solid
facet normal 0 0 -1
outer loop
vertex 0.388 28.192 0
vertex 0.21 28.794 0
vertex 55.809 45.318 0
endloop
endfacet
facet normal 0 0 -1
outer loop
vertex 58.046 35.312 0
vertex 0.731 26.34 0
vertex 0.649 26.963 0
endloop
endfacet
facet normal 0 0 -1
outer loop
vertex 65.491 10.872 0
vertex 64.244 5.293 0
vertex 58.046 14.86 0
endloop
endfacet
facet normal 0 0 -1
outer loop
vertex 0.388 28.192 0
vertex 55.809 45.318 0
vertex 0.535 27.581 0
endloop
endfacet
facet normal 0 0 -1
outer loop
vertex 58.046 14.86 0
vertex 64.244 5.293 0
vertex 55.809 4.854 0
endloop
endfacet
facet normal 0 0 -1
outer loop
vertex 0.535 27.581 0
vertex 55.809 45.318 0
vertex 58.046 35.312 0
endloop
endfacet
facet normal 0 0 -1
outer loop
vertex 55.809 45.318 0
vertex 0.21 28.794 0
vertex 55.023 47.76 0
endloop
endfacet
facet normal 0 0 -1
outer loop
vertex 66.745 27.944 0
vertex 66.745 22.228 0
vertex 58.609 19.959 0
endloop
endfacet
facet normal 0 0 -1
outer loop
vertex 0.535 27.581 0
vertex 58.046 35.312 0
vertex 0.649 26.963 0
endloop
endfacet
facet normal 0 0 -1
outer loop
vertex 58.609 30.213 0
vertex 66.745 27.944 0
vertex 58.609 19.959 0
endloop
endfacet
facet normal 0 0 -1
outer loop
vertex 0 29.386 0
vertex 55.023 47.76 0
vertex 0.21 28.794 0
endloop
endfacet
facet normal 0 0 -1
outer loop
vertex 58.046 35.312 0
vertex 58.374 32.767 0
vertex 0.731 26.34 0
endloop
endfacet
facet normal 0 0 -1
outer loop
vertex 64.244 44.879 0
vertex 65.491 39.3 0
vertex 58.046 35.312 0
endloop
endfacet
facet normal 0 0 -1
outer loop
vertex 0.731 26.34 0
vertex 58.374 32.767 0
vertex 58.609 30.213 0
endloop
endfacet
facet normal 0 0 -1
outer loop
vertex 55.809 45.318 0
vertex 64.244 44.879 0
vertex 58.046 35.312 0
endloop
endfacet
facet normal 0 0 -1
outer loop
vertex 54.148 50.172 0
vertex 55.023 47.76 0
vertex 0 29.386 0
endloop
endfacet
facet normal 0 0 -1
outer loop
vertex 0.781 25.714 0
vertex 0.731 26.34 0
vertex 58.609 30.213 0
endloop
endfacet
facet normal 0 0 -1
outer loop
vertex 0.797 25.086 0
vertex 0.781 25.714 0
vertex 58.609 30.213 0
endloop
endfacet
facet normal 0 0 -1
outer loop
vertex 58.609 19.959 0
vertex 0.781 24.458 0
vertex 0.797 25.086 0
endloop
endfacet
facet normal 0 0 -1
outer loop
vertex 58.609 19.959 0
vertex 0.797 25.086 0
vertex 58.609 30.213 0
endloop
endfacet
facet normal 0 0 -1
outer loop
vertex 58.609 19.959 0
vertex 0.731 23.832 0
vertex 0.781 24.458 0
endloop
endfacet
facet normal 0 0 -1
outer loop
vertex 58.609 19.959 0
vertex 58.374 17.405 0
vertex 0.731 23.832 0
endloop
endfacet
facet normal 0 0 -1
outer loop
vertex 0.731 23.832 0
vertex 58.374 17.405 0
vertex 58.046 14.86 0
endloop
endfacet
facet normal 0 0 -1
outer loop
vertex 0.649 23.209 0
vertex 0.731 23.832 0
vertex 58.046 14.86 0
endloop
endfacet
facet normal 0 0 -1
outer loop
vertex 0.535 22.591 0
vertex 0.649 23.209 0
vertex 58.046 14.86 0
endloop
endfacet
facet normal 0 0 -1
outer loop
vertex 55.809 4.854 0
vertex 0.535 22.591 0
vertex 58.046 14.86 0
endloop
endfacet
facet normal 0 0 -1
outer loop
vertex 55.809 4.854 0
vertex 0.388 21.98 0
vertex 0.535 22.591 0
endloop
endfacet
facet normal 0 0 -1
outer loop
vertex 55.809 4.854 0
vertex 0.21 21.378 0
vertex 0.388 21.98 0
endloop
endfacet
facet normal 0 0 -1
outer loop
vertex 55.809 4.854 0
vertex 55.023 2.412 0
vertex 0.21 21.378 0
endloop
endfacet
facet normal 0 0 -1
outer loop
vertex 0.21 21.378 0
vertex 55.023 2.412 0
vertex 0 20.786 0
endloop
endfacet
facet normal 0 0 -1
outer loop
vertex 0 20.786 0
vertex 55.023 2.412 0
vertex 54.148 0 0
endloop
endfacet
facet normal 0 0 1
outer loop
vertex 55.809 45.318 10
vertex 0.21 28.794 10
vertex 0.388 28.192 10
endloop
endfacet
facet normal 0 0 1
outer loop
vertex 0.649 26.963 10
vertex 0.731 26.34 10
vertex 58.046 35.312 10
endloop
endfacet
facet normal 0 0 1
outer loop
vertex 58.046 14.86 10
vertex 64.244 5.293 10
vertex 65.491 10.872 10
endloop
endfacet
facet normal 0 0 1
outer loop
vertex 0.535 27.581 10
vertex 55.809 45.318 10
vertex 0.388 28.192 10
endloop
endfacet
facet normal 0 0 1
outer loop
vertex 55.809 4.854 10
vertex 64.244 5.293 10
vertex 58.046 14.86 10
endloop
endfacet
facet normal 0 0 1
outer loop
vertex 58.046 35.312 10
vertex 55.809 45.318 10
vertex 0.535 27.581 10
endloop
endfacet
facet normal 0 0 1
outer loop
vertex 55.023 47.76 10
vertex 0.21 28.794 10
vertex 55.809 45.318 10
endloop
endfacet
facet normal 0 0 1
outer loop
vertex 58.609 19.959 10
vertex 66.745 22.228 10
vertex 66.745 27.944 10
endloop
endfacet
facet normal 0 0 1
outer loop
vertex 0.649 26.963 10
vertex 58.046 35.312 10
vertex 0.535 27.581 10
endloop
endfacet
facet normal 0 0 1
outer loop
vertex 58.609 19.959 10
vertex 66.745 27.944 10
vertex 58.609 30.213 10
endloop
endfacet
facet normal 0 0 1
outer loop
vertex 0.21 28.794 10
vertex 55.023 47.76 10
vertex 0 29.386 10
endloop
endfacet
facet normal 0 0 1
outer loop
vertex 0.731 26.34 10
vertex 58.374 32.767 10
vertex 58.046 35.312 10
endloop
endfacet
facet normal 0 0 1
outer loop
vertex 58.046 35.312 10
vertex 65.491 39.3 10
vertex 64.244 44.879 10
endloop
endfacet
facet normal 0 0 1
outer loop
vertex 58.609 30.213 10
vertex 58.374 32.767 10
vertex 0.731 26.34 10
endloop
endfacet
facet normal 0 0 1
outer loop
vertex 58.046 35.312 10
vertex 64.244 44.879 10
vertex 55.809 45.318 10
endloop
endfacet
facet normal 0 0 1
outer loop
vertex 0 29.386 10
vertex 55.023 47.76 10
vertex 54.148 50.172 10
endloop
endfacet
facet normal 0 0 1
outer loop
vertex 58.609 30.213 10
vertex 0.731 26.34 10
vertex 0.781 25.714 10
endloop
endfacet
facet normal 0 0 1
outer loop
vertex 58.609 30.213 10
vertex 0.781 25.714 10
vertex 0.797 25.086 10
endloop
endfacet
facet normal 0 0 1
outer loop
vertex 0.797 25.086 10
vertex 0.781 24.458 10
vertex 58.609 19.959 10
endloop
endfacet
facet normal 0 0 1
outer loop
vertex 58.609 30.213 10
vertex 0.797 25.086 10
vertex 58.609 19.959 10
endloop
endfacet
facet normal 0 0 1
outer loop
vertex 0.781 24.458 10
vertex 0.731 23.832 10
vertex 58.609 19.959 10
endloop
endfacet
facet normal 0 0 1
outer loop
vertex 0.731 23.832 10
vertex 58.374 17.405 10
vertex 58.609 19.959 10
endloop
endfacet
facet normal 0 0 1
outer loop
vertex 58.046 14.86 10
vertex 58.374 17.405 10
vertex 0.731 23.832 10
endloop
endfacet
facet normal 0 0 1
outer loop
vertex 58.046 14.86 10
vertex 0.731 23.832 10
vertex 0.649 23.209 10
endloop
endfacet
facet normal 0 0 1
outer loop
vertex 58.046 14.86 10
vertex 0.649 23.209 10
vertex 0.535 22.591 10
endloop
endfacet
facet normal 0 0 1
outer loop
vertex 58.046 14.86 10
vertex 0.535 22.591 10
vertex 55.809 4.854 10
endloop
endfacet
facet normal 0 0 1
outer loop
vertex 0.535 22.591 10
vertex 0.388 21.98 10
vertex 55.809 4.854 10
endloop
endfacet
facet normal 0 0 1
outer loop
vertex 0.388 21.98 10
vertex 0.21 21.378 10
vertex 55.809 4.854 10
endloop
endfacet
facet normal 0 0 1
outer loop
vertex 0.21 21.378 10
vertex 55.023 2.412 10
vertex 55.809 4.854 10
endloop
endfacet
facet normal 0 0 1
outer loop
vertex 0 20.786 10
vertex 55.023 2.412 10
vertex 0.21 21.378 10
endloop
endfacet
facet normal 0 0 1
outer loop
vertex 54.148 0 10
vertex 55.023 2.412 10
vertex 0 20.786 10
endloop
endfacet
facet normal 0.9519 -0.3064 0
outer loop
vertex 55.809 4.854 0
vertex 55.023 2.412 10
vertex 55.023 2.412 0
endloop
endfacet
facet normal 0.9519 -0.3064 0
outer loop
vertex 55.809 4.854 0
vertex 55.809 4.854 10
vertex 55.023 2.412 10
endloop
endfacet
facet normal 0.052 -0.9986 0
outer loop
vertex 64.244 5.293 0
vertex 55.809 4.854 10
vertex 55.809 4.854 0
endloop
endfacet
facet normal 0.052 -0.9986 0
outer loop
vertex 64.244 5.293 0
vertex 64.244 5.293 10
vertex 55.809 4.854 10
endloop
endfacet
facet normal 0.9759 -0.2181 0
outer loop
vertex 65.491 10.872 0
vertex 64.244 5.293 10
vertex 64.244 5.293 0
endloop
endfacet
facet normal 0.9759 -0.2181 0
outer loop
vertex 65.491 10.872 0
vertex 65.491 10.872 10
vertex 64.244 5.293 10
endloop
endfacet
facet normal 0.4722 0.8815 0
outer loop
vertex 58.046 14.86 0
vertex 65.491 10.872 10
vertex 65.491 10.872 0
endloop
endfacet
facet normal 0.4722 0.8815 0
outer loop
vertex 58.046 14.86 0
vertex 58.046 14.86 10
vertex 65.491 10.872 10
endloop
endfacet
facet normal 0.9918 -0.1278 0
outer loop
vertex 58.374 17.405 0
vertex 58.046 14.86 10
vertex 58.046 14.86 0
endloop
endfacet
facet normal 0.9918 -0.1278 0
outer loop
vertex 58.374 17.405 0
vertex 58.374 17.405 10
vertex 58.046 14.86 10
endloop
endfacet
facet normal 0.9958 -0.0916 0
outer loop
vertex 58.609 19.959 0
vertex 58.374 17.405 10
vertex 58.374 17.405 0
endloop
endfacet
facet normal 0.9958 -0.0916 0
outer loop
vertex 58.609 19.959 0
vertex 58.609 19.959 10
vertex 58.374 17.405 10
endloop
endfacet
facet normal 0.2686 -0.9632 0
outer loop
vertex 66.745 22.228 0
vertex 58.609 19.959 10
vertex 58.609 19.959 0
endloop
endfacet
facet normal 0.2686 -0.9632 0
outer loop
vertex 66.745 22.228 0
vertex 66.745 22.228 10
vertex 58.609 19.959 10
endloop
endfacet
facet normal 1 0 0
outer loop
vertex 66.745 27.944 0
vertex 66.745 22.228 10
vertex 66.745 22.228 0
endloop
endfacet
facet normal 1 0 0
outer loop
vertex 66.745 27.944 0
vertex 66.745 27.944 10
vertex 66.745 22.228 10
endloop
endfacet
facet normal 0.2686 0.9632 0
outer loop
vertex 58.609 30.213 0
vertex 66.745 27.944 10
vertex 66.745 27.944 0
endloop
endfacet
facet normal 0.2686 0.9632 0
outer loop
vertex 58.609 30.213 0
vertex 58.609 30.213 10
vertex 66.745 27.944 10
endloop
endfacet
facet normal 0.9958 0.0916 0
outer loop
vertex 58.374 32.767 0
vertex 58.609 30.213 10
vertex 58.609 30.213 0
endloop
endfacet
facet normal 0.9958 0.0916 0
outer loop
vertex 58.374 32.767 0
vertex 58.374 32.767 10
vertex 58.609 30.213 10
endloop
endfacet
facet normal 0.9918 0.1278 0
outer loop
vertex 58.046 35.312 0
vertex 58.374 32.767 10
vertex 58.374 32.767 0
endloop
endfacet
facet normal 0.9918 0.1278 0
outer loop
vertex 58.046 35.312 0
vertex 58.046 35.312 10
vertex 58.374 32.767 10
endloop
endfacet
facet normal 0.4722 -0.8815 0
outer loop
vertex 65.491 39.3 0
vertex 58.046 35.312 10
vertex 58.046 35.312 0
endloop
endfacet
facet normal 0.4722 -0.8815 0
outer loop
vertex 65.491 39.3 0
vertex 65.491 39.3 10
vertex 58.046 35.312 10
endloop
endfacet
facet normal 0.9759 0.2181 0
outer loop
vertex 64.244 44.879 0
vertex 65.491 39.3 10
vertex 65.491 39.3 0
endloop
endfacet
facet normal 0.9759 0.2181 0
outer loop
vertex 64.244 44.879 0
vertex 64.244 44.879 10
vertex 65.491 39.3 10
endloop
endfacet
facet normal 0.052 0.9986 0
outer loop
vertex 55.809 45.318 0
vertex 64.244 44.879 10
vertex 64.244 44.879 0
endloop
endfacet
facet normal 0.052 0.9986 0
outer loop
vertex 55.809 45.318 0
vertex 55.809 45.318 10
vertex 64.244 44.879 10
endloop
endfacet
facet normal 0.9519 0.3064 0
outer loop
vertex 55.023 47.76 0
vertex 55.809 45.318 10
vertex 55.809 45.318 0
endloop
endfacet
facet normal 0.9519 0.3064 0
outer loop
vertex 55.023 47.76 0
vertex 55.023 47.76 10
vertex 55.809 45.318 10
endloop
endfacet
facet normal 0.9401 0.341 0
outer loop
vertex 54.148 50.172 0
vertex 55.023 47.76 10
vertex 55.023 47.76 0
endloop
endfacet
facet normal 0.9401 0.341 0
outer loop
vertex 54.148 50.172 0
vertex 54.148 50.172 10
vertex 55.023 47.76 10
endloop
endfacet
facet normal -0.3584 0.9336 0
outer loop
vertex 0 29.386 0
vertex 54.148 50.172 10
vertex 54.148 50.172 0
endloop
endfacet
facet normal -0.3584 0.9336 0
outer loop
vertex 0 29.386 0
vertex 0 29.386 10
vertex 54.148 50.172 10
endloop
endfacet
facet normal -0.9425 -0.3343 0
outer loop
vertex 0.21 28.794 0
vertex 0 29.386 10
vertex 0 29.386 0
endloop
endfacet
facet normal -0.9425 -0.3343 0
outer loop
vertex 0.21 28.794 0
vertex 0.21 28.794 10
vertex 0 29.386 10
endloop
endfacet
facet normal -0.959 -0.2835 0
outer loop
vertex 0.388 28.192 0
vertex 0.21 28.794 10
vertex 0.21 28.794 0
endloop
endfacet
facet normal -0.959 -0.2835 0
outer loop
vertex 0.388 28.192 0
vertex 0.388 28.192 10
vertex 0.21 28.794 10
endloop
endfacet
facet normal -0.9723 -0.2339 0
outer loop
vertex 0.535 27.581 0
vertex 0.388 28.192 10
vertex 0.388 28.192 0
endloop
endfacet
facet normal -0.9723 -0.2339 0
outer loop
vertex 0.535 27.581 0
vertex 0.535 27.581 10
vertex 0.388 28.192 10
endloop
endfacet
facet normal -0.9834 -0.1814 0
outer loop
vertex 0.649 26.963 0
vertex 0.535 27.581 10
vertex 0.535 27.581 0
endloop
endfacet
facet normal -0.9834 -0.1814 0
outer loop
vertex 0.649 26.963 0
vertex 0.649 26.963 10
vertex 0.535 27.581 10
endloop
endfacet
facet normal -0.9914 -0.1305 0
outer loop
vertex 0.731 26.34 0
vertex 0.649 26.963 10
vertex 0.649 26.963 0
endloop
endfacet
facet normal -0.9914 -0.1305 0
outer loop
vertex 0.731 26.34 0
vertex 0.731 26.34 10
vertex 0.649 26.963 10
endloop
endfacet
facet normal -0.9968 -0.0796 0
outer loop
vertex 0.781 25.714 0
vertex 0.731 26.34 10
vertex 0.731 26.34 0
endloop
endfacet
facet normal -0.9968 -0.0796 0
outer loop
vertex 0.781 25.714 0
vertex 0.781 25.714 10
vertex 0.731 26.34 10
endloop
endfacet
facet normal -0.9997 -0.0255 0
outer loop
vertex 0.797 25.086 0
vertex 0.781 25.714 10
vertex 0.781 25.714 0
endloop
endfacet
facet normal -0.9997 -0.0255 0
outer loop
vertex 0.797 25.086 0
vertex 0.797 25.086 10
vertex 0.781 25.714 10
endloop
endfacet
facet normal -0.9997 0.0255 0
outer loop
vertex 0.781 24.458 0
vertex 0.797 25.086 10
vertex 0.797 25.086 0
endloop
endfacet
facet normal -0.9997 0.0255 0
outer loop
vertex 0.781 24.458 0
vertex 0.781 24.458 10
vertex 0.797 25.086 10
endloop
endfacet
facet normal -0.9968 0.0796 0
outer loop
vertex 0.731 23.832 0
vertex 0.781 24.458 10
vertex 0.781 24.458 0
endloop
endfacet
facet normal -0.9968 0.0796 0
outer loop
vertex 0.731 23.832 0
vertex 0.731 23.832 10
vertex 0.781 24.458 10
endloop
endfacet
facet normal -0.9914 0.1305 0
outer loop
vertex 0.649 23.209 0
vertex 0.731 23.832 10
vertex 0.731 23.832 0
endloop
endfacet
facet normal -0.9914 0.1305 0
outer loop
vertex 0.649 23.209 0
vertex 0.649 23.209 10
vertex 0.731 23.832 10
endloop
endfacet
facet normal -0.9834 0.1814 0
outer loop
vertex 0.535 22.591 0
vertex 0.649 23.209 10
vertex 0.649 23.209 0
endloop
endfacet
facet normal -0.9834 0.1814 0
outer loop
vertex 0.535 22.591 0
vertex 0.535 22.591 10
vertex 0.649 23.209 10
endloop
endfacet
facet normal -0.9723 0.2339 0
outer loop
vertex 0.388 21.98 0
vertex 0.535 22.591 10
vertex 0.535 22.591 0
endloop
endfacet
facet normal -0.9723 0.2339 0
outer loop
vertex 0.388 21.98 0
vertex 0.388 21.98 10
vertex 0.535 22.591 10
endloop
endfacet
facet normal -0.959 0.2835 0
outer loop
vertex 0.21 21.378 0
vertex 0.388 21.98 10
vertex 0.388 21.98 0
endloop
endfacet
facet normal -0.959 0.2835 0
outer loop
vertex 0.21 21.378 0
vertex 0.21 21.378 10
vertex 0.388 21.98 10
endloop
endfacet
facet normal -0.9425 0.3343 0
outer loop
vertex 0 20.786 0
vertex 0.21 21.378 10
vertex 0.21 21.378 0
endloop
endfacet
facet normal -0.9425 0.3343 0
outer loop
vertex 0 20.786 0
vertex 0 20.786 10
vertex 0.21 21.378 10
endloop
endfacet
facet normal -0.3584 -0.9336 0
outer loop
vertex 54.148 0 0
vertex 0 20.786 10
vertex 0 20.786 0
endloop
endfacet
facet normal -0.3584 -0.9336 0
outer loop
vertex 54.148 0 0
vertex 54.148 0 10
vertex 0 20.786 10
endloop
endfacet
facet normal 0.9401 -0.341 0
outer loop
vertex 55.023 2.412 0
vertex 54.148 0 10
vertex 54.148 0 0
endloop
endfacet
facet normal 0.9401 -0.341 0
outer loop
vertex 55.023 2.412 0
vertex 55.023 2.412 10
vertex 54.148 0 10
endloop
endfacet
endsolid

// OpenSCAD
$fn = 32;

// ----------------------------------------------------------------------
// Gear sector: 3 teeth on 42 degrees
// ----------------------------------------------------------------------

// --- parameters (mm) ---
sector_angle = 42;        // sector angle, degrees
root_r = 70;              // root circle radius
tooth_h = 8;              // tooth height over the root circle
teeth = 3;                // number of teeth on the sector
hub_r = 12;               // hub bore radius
plate_t = 10;             // sector thickness, Z
arc_step = 3;             // sampling step of the root/hub arcs, degrees

tip_r = root_r + tooth_h;  // tip circle radius

profile = [[54.148, 0], [55.023, 2.412], [55.809, 4.854], [64.244, 5.293], [65.491, 10.872], [58.046, 14.86], [58.374, 17.405], [58.609, 19.959], [66.745, 22.228], [66.745, 27.944], [58.609, 30.213], [58.374, 32.767], [58.046, 35.312], [65.491, 39.3], [64.244, 44.879], [55.809, 45.318], [55.023, 47.76], [54.148, 50.172], [0, 29.386], [0.21, 28.794], [0.388, 28.192], [0.535, 27.581], [0.649, 26.963], [0.731, 26.34], [0.781, 25.714], [0.797, 25.086], [0.781, 24.458], [0.731, 23.832], [0.649, 23.209], [0.535, 22.591], [0.388, 21.98], [0.21, 21.378], [0, 20.786]];  // primary outline, 33 points, counter clockwise

// --- the one profile operation ---
linear_extrude(height = plate_t) polygon(points = profile);
